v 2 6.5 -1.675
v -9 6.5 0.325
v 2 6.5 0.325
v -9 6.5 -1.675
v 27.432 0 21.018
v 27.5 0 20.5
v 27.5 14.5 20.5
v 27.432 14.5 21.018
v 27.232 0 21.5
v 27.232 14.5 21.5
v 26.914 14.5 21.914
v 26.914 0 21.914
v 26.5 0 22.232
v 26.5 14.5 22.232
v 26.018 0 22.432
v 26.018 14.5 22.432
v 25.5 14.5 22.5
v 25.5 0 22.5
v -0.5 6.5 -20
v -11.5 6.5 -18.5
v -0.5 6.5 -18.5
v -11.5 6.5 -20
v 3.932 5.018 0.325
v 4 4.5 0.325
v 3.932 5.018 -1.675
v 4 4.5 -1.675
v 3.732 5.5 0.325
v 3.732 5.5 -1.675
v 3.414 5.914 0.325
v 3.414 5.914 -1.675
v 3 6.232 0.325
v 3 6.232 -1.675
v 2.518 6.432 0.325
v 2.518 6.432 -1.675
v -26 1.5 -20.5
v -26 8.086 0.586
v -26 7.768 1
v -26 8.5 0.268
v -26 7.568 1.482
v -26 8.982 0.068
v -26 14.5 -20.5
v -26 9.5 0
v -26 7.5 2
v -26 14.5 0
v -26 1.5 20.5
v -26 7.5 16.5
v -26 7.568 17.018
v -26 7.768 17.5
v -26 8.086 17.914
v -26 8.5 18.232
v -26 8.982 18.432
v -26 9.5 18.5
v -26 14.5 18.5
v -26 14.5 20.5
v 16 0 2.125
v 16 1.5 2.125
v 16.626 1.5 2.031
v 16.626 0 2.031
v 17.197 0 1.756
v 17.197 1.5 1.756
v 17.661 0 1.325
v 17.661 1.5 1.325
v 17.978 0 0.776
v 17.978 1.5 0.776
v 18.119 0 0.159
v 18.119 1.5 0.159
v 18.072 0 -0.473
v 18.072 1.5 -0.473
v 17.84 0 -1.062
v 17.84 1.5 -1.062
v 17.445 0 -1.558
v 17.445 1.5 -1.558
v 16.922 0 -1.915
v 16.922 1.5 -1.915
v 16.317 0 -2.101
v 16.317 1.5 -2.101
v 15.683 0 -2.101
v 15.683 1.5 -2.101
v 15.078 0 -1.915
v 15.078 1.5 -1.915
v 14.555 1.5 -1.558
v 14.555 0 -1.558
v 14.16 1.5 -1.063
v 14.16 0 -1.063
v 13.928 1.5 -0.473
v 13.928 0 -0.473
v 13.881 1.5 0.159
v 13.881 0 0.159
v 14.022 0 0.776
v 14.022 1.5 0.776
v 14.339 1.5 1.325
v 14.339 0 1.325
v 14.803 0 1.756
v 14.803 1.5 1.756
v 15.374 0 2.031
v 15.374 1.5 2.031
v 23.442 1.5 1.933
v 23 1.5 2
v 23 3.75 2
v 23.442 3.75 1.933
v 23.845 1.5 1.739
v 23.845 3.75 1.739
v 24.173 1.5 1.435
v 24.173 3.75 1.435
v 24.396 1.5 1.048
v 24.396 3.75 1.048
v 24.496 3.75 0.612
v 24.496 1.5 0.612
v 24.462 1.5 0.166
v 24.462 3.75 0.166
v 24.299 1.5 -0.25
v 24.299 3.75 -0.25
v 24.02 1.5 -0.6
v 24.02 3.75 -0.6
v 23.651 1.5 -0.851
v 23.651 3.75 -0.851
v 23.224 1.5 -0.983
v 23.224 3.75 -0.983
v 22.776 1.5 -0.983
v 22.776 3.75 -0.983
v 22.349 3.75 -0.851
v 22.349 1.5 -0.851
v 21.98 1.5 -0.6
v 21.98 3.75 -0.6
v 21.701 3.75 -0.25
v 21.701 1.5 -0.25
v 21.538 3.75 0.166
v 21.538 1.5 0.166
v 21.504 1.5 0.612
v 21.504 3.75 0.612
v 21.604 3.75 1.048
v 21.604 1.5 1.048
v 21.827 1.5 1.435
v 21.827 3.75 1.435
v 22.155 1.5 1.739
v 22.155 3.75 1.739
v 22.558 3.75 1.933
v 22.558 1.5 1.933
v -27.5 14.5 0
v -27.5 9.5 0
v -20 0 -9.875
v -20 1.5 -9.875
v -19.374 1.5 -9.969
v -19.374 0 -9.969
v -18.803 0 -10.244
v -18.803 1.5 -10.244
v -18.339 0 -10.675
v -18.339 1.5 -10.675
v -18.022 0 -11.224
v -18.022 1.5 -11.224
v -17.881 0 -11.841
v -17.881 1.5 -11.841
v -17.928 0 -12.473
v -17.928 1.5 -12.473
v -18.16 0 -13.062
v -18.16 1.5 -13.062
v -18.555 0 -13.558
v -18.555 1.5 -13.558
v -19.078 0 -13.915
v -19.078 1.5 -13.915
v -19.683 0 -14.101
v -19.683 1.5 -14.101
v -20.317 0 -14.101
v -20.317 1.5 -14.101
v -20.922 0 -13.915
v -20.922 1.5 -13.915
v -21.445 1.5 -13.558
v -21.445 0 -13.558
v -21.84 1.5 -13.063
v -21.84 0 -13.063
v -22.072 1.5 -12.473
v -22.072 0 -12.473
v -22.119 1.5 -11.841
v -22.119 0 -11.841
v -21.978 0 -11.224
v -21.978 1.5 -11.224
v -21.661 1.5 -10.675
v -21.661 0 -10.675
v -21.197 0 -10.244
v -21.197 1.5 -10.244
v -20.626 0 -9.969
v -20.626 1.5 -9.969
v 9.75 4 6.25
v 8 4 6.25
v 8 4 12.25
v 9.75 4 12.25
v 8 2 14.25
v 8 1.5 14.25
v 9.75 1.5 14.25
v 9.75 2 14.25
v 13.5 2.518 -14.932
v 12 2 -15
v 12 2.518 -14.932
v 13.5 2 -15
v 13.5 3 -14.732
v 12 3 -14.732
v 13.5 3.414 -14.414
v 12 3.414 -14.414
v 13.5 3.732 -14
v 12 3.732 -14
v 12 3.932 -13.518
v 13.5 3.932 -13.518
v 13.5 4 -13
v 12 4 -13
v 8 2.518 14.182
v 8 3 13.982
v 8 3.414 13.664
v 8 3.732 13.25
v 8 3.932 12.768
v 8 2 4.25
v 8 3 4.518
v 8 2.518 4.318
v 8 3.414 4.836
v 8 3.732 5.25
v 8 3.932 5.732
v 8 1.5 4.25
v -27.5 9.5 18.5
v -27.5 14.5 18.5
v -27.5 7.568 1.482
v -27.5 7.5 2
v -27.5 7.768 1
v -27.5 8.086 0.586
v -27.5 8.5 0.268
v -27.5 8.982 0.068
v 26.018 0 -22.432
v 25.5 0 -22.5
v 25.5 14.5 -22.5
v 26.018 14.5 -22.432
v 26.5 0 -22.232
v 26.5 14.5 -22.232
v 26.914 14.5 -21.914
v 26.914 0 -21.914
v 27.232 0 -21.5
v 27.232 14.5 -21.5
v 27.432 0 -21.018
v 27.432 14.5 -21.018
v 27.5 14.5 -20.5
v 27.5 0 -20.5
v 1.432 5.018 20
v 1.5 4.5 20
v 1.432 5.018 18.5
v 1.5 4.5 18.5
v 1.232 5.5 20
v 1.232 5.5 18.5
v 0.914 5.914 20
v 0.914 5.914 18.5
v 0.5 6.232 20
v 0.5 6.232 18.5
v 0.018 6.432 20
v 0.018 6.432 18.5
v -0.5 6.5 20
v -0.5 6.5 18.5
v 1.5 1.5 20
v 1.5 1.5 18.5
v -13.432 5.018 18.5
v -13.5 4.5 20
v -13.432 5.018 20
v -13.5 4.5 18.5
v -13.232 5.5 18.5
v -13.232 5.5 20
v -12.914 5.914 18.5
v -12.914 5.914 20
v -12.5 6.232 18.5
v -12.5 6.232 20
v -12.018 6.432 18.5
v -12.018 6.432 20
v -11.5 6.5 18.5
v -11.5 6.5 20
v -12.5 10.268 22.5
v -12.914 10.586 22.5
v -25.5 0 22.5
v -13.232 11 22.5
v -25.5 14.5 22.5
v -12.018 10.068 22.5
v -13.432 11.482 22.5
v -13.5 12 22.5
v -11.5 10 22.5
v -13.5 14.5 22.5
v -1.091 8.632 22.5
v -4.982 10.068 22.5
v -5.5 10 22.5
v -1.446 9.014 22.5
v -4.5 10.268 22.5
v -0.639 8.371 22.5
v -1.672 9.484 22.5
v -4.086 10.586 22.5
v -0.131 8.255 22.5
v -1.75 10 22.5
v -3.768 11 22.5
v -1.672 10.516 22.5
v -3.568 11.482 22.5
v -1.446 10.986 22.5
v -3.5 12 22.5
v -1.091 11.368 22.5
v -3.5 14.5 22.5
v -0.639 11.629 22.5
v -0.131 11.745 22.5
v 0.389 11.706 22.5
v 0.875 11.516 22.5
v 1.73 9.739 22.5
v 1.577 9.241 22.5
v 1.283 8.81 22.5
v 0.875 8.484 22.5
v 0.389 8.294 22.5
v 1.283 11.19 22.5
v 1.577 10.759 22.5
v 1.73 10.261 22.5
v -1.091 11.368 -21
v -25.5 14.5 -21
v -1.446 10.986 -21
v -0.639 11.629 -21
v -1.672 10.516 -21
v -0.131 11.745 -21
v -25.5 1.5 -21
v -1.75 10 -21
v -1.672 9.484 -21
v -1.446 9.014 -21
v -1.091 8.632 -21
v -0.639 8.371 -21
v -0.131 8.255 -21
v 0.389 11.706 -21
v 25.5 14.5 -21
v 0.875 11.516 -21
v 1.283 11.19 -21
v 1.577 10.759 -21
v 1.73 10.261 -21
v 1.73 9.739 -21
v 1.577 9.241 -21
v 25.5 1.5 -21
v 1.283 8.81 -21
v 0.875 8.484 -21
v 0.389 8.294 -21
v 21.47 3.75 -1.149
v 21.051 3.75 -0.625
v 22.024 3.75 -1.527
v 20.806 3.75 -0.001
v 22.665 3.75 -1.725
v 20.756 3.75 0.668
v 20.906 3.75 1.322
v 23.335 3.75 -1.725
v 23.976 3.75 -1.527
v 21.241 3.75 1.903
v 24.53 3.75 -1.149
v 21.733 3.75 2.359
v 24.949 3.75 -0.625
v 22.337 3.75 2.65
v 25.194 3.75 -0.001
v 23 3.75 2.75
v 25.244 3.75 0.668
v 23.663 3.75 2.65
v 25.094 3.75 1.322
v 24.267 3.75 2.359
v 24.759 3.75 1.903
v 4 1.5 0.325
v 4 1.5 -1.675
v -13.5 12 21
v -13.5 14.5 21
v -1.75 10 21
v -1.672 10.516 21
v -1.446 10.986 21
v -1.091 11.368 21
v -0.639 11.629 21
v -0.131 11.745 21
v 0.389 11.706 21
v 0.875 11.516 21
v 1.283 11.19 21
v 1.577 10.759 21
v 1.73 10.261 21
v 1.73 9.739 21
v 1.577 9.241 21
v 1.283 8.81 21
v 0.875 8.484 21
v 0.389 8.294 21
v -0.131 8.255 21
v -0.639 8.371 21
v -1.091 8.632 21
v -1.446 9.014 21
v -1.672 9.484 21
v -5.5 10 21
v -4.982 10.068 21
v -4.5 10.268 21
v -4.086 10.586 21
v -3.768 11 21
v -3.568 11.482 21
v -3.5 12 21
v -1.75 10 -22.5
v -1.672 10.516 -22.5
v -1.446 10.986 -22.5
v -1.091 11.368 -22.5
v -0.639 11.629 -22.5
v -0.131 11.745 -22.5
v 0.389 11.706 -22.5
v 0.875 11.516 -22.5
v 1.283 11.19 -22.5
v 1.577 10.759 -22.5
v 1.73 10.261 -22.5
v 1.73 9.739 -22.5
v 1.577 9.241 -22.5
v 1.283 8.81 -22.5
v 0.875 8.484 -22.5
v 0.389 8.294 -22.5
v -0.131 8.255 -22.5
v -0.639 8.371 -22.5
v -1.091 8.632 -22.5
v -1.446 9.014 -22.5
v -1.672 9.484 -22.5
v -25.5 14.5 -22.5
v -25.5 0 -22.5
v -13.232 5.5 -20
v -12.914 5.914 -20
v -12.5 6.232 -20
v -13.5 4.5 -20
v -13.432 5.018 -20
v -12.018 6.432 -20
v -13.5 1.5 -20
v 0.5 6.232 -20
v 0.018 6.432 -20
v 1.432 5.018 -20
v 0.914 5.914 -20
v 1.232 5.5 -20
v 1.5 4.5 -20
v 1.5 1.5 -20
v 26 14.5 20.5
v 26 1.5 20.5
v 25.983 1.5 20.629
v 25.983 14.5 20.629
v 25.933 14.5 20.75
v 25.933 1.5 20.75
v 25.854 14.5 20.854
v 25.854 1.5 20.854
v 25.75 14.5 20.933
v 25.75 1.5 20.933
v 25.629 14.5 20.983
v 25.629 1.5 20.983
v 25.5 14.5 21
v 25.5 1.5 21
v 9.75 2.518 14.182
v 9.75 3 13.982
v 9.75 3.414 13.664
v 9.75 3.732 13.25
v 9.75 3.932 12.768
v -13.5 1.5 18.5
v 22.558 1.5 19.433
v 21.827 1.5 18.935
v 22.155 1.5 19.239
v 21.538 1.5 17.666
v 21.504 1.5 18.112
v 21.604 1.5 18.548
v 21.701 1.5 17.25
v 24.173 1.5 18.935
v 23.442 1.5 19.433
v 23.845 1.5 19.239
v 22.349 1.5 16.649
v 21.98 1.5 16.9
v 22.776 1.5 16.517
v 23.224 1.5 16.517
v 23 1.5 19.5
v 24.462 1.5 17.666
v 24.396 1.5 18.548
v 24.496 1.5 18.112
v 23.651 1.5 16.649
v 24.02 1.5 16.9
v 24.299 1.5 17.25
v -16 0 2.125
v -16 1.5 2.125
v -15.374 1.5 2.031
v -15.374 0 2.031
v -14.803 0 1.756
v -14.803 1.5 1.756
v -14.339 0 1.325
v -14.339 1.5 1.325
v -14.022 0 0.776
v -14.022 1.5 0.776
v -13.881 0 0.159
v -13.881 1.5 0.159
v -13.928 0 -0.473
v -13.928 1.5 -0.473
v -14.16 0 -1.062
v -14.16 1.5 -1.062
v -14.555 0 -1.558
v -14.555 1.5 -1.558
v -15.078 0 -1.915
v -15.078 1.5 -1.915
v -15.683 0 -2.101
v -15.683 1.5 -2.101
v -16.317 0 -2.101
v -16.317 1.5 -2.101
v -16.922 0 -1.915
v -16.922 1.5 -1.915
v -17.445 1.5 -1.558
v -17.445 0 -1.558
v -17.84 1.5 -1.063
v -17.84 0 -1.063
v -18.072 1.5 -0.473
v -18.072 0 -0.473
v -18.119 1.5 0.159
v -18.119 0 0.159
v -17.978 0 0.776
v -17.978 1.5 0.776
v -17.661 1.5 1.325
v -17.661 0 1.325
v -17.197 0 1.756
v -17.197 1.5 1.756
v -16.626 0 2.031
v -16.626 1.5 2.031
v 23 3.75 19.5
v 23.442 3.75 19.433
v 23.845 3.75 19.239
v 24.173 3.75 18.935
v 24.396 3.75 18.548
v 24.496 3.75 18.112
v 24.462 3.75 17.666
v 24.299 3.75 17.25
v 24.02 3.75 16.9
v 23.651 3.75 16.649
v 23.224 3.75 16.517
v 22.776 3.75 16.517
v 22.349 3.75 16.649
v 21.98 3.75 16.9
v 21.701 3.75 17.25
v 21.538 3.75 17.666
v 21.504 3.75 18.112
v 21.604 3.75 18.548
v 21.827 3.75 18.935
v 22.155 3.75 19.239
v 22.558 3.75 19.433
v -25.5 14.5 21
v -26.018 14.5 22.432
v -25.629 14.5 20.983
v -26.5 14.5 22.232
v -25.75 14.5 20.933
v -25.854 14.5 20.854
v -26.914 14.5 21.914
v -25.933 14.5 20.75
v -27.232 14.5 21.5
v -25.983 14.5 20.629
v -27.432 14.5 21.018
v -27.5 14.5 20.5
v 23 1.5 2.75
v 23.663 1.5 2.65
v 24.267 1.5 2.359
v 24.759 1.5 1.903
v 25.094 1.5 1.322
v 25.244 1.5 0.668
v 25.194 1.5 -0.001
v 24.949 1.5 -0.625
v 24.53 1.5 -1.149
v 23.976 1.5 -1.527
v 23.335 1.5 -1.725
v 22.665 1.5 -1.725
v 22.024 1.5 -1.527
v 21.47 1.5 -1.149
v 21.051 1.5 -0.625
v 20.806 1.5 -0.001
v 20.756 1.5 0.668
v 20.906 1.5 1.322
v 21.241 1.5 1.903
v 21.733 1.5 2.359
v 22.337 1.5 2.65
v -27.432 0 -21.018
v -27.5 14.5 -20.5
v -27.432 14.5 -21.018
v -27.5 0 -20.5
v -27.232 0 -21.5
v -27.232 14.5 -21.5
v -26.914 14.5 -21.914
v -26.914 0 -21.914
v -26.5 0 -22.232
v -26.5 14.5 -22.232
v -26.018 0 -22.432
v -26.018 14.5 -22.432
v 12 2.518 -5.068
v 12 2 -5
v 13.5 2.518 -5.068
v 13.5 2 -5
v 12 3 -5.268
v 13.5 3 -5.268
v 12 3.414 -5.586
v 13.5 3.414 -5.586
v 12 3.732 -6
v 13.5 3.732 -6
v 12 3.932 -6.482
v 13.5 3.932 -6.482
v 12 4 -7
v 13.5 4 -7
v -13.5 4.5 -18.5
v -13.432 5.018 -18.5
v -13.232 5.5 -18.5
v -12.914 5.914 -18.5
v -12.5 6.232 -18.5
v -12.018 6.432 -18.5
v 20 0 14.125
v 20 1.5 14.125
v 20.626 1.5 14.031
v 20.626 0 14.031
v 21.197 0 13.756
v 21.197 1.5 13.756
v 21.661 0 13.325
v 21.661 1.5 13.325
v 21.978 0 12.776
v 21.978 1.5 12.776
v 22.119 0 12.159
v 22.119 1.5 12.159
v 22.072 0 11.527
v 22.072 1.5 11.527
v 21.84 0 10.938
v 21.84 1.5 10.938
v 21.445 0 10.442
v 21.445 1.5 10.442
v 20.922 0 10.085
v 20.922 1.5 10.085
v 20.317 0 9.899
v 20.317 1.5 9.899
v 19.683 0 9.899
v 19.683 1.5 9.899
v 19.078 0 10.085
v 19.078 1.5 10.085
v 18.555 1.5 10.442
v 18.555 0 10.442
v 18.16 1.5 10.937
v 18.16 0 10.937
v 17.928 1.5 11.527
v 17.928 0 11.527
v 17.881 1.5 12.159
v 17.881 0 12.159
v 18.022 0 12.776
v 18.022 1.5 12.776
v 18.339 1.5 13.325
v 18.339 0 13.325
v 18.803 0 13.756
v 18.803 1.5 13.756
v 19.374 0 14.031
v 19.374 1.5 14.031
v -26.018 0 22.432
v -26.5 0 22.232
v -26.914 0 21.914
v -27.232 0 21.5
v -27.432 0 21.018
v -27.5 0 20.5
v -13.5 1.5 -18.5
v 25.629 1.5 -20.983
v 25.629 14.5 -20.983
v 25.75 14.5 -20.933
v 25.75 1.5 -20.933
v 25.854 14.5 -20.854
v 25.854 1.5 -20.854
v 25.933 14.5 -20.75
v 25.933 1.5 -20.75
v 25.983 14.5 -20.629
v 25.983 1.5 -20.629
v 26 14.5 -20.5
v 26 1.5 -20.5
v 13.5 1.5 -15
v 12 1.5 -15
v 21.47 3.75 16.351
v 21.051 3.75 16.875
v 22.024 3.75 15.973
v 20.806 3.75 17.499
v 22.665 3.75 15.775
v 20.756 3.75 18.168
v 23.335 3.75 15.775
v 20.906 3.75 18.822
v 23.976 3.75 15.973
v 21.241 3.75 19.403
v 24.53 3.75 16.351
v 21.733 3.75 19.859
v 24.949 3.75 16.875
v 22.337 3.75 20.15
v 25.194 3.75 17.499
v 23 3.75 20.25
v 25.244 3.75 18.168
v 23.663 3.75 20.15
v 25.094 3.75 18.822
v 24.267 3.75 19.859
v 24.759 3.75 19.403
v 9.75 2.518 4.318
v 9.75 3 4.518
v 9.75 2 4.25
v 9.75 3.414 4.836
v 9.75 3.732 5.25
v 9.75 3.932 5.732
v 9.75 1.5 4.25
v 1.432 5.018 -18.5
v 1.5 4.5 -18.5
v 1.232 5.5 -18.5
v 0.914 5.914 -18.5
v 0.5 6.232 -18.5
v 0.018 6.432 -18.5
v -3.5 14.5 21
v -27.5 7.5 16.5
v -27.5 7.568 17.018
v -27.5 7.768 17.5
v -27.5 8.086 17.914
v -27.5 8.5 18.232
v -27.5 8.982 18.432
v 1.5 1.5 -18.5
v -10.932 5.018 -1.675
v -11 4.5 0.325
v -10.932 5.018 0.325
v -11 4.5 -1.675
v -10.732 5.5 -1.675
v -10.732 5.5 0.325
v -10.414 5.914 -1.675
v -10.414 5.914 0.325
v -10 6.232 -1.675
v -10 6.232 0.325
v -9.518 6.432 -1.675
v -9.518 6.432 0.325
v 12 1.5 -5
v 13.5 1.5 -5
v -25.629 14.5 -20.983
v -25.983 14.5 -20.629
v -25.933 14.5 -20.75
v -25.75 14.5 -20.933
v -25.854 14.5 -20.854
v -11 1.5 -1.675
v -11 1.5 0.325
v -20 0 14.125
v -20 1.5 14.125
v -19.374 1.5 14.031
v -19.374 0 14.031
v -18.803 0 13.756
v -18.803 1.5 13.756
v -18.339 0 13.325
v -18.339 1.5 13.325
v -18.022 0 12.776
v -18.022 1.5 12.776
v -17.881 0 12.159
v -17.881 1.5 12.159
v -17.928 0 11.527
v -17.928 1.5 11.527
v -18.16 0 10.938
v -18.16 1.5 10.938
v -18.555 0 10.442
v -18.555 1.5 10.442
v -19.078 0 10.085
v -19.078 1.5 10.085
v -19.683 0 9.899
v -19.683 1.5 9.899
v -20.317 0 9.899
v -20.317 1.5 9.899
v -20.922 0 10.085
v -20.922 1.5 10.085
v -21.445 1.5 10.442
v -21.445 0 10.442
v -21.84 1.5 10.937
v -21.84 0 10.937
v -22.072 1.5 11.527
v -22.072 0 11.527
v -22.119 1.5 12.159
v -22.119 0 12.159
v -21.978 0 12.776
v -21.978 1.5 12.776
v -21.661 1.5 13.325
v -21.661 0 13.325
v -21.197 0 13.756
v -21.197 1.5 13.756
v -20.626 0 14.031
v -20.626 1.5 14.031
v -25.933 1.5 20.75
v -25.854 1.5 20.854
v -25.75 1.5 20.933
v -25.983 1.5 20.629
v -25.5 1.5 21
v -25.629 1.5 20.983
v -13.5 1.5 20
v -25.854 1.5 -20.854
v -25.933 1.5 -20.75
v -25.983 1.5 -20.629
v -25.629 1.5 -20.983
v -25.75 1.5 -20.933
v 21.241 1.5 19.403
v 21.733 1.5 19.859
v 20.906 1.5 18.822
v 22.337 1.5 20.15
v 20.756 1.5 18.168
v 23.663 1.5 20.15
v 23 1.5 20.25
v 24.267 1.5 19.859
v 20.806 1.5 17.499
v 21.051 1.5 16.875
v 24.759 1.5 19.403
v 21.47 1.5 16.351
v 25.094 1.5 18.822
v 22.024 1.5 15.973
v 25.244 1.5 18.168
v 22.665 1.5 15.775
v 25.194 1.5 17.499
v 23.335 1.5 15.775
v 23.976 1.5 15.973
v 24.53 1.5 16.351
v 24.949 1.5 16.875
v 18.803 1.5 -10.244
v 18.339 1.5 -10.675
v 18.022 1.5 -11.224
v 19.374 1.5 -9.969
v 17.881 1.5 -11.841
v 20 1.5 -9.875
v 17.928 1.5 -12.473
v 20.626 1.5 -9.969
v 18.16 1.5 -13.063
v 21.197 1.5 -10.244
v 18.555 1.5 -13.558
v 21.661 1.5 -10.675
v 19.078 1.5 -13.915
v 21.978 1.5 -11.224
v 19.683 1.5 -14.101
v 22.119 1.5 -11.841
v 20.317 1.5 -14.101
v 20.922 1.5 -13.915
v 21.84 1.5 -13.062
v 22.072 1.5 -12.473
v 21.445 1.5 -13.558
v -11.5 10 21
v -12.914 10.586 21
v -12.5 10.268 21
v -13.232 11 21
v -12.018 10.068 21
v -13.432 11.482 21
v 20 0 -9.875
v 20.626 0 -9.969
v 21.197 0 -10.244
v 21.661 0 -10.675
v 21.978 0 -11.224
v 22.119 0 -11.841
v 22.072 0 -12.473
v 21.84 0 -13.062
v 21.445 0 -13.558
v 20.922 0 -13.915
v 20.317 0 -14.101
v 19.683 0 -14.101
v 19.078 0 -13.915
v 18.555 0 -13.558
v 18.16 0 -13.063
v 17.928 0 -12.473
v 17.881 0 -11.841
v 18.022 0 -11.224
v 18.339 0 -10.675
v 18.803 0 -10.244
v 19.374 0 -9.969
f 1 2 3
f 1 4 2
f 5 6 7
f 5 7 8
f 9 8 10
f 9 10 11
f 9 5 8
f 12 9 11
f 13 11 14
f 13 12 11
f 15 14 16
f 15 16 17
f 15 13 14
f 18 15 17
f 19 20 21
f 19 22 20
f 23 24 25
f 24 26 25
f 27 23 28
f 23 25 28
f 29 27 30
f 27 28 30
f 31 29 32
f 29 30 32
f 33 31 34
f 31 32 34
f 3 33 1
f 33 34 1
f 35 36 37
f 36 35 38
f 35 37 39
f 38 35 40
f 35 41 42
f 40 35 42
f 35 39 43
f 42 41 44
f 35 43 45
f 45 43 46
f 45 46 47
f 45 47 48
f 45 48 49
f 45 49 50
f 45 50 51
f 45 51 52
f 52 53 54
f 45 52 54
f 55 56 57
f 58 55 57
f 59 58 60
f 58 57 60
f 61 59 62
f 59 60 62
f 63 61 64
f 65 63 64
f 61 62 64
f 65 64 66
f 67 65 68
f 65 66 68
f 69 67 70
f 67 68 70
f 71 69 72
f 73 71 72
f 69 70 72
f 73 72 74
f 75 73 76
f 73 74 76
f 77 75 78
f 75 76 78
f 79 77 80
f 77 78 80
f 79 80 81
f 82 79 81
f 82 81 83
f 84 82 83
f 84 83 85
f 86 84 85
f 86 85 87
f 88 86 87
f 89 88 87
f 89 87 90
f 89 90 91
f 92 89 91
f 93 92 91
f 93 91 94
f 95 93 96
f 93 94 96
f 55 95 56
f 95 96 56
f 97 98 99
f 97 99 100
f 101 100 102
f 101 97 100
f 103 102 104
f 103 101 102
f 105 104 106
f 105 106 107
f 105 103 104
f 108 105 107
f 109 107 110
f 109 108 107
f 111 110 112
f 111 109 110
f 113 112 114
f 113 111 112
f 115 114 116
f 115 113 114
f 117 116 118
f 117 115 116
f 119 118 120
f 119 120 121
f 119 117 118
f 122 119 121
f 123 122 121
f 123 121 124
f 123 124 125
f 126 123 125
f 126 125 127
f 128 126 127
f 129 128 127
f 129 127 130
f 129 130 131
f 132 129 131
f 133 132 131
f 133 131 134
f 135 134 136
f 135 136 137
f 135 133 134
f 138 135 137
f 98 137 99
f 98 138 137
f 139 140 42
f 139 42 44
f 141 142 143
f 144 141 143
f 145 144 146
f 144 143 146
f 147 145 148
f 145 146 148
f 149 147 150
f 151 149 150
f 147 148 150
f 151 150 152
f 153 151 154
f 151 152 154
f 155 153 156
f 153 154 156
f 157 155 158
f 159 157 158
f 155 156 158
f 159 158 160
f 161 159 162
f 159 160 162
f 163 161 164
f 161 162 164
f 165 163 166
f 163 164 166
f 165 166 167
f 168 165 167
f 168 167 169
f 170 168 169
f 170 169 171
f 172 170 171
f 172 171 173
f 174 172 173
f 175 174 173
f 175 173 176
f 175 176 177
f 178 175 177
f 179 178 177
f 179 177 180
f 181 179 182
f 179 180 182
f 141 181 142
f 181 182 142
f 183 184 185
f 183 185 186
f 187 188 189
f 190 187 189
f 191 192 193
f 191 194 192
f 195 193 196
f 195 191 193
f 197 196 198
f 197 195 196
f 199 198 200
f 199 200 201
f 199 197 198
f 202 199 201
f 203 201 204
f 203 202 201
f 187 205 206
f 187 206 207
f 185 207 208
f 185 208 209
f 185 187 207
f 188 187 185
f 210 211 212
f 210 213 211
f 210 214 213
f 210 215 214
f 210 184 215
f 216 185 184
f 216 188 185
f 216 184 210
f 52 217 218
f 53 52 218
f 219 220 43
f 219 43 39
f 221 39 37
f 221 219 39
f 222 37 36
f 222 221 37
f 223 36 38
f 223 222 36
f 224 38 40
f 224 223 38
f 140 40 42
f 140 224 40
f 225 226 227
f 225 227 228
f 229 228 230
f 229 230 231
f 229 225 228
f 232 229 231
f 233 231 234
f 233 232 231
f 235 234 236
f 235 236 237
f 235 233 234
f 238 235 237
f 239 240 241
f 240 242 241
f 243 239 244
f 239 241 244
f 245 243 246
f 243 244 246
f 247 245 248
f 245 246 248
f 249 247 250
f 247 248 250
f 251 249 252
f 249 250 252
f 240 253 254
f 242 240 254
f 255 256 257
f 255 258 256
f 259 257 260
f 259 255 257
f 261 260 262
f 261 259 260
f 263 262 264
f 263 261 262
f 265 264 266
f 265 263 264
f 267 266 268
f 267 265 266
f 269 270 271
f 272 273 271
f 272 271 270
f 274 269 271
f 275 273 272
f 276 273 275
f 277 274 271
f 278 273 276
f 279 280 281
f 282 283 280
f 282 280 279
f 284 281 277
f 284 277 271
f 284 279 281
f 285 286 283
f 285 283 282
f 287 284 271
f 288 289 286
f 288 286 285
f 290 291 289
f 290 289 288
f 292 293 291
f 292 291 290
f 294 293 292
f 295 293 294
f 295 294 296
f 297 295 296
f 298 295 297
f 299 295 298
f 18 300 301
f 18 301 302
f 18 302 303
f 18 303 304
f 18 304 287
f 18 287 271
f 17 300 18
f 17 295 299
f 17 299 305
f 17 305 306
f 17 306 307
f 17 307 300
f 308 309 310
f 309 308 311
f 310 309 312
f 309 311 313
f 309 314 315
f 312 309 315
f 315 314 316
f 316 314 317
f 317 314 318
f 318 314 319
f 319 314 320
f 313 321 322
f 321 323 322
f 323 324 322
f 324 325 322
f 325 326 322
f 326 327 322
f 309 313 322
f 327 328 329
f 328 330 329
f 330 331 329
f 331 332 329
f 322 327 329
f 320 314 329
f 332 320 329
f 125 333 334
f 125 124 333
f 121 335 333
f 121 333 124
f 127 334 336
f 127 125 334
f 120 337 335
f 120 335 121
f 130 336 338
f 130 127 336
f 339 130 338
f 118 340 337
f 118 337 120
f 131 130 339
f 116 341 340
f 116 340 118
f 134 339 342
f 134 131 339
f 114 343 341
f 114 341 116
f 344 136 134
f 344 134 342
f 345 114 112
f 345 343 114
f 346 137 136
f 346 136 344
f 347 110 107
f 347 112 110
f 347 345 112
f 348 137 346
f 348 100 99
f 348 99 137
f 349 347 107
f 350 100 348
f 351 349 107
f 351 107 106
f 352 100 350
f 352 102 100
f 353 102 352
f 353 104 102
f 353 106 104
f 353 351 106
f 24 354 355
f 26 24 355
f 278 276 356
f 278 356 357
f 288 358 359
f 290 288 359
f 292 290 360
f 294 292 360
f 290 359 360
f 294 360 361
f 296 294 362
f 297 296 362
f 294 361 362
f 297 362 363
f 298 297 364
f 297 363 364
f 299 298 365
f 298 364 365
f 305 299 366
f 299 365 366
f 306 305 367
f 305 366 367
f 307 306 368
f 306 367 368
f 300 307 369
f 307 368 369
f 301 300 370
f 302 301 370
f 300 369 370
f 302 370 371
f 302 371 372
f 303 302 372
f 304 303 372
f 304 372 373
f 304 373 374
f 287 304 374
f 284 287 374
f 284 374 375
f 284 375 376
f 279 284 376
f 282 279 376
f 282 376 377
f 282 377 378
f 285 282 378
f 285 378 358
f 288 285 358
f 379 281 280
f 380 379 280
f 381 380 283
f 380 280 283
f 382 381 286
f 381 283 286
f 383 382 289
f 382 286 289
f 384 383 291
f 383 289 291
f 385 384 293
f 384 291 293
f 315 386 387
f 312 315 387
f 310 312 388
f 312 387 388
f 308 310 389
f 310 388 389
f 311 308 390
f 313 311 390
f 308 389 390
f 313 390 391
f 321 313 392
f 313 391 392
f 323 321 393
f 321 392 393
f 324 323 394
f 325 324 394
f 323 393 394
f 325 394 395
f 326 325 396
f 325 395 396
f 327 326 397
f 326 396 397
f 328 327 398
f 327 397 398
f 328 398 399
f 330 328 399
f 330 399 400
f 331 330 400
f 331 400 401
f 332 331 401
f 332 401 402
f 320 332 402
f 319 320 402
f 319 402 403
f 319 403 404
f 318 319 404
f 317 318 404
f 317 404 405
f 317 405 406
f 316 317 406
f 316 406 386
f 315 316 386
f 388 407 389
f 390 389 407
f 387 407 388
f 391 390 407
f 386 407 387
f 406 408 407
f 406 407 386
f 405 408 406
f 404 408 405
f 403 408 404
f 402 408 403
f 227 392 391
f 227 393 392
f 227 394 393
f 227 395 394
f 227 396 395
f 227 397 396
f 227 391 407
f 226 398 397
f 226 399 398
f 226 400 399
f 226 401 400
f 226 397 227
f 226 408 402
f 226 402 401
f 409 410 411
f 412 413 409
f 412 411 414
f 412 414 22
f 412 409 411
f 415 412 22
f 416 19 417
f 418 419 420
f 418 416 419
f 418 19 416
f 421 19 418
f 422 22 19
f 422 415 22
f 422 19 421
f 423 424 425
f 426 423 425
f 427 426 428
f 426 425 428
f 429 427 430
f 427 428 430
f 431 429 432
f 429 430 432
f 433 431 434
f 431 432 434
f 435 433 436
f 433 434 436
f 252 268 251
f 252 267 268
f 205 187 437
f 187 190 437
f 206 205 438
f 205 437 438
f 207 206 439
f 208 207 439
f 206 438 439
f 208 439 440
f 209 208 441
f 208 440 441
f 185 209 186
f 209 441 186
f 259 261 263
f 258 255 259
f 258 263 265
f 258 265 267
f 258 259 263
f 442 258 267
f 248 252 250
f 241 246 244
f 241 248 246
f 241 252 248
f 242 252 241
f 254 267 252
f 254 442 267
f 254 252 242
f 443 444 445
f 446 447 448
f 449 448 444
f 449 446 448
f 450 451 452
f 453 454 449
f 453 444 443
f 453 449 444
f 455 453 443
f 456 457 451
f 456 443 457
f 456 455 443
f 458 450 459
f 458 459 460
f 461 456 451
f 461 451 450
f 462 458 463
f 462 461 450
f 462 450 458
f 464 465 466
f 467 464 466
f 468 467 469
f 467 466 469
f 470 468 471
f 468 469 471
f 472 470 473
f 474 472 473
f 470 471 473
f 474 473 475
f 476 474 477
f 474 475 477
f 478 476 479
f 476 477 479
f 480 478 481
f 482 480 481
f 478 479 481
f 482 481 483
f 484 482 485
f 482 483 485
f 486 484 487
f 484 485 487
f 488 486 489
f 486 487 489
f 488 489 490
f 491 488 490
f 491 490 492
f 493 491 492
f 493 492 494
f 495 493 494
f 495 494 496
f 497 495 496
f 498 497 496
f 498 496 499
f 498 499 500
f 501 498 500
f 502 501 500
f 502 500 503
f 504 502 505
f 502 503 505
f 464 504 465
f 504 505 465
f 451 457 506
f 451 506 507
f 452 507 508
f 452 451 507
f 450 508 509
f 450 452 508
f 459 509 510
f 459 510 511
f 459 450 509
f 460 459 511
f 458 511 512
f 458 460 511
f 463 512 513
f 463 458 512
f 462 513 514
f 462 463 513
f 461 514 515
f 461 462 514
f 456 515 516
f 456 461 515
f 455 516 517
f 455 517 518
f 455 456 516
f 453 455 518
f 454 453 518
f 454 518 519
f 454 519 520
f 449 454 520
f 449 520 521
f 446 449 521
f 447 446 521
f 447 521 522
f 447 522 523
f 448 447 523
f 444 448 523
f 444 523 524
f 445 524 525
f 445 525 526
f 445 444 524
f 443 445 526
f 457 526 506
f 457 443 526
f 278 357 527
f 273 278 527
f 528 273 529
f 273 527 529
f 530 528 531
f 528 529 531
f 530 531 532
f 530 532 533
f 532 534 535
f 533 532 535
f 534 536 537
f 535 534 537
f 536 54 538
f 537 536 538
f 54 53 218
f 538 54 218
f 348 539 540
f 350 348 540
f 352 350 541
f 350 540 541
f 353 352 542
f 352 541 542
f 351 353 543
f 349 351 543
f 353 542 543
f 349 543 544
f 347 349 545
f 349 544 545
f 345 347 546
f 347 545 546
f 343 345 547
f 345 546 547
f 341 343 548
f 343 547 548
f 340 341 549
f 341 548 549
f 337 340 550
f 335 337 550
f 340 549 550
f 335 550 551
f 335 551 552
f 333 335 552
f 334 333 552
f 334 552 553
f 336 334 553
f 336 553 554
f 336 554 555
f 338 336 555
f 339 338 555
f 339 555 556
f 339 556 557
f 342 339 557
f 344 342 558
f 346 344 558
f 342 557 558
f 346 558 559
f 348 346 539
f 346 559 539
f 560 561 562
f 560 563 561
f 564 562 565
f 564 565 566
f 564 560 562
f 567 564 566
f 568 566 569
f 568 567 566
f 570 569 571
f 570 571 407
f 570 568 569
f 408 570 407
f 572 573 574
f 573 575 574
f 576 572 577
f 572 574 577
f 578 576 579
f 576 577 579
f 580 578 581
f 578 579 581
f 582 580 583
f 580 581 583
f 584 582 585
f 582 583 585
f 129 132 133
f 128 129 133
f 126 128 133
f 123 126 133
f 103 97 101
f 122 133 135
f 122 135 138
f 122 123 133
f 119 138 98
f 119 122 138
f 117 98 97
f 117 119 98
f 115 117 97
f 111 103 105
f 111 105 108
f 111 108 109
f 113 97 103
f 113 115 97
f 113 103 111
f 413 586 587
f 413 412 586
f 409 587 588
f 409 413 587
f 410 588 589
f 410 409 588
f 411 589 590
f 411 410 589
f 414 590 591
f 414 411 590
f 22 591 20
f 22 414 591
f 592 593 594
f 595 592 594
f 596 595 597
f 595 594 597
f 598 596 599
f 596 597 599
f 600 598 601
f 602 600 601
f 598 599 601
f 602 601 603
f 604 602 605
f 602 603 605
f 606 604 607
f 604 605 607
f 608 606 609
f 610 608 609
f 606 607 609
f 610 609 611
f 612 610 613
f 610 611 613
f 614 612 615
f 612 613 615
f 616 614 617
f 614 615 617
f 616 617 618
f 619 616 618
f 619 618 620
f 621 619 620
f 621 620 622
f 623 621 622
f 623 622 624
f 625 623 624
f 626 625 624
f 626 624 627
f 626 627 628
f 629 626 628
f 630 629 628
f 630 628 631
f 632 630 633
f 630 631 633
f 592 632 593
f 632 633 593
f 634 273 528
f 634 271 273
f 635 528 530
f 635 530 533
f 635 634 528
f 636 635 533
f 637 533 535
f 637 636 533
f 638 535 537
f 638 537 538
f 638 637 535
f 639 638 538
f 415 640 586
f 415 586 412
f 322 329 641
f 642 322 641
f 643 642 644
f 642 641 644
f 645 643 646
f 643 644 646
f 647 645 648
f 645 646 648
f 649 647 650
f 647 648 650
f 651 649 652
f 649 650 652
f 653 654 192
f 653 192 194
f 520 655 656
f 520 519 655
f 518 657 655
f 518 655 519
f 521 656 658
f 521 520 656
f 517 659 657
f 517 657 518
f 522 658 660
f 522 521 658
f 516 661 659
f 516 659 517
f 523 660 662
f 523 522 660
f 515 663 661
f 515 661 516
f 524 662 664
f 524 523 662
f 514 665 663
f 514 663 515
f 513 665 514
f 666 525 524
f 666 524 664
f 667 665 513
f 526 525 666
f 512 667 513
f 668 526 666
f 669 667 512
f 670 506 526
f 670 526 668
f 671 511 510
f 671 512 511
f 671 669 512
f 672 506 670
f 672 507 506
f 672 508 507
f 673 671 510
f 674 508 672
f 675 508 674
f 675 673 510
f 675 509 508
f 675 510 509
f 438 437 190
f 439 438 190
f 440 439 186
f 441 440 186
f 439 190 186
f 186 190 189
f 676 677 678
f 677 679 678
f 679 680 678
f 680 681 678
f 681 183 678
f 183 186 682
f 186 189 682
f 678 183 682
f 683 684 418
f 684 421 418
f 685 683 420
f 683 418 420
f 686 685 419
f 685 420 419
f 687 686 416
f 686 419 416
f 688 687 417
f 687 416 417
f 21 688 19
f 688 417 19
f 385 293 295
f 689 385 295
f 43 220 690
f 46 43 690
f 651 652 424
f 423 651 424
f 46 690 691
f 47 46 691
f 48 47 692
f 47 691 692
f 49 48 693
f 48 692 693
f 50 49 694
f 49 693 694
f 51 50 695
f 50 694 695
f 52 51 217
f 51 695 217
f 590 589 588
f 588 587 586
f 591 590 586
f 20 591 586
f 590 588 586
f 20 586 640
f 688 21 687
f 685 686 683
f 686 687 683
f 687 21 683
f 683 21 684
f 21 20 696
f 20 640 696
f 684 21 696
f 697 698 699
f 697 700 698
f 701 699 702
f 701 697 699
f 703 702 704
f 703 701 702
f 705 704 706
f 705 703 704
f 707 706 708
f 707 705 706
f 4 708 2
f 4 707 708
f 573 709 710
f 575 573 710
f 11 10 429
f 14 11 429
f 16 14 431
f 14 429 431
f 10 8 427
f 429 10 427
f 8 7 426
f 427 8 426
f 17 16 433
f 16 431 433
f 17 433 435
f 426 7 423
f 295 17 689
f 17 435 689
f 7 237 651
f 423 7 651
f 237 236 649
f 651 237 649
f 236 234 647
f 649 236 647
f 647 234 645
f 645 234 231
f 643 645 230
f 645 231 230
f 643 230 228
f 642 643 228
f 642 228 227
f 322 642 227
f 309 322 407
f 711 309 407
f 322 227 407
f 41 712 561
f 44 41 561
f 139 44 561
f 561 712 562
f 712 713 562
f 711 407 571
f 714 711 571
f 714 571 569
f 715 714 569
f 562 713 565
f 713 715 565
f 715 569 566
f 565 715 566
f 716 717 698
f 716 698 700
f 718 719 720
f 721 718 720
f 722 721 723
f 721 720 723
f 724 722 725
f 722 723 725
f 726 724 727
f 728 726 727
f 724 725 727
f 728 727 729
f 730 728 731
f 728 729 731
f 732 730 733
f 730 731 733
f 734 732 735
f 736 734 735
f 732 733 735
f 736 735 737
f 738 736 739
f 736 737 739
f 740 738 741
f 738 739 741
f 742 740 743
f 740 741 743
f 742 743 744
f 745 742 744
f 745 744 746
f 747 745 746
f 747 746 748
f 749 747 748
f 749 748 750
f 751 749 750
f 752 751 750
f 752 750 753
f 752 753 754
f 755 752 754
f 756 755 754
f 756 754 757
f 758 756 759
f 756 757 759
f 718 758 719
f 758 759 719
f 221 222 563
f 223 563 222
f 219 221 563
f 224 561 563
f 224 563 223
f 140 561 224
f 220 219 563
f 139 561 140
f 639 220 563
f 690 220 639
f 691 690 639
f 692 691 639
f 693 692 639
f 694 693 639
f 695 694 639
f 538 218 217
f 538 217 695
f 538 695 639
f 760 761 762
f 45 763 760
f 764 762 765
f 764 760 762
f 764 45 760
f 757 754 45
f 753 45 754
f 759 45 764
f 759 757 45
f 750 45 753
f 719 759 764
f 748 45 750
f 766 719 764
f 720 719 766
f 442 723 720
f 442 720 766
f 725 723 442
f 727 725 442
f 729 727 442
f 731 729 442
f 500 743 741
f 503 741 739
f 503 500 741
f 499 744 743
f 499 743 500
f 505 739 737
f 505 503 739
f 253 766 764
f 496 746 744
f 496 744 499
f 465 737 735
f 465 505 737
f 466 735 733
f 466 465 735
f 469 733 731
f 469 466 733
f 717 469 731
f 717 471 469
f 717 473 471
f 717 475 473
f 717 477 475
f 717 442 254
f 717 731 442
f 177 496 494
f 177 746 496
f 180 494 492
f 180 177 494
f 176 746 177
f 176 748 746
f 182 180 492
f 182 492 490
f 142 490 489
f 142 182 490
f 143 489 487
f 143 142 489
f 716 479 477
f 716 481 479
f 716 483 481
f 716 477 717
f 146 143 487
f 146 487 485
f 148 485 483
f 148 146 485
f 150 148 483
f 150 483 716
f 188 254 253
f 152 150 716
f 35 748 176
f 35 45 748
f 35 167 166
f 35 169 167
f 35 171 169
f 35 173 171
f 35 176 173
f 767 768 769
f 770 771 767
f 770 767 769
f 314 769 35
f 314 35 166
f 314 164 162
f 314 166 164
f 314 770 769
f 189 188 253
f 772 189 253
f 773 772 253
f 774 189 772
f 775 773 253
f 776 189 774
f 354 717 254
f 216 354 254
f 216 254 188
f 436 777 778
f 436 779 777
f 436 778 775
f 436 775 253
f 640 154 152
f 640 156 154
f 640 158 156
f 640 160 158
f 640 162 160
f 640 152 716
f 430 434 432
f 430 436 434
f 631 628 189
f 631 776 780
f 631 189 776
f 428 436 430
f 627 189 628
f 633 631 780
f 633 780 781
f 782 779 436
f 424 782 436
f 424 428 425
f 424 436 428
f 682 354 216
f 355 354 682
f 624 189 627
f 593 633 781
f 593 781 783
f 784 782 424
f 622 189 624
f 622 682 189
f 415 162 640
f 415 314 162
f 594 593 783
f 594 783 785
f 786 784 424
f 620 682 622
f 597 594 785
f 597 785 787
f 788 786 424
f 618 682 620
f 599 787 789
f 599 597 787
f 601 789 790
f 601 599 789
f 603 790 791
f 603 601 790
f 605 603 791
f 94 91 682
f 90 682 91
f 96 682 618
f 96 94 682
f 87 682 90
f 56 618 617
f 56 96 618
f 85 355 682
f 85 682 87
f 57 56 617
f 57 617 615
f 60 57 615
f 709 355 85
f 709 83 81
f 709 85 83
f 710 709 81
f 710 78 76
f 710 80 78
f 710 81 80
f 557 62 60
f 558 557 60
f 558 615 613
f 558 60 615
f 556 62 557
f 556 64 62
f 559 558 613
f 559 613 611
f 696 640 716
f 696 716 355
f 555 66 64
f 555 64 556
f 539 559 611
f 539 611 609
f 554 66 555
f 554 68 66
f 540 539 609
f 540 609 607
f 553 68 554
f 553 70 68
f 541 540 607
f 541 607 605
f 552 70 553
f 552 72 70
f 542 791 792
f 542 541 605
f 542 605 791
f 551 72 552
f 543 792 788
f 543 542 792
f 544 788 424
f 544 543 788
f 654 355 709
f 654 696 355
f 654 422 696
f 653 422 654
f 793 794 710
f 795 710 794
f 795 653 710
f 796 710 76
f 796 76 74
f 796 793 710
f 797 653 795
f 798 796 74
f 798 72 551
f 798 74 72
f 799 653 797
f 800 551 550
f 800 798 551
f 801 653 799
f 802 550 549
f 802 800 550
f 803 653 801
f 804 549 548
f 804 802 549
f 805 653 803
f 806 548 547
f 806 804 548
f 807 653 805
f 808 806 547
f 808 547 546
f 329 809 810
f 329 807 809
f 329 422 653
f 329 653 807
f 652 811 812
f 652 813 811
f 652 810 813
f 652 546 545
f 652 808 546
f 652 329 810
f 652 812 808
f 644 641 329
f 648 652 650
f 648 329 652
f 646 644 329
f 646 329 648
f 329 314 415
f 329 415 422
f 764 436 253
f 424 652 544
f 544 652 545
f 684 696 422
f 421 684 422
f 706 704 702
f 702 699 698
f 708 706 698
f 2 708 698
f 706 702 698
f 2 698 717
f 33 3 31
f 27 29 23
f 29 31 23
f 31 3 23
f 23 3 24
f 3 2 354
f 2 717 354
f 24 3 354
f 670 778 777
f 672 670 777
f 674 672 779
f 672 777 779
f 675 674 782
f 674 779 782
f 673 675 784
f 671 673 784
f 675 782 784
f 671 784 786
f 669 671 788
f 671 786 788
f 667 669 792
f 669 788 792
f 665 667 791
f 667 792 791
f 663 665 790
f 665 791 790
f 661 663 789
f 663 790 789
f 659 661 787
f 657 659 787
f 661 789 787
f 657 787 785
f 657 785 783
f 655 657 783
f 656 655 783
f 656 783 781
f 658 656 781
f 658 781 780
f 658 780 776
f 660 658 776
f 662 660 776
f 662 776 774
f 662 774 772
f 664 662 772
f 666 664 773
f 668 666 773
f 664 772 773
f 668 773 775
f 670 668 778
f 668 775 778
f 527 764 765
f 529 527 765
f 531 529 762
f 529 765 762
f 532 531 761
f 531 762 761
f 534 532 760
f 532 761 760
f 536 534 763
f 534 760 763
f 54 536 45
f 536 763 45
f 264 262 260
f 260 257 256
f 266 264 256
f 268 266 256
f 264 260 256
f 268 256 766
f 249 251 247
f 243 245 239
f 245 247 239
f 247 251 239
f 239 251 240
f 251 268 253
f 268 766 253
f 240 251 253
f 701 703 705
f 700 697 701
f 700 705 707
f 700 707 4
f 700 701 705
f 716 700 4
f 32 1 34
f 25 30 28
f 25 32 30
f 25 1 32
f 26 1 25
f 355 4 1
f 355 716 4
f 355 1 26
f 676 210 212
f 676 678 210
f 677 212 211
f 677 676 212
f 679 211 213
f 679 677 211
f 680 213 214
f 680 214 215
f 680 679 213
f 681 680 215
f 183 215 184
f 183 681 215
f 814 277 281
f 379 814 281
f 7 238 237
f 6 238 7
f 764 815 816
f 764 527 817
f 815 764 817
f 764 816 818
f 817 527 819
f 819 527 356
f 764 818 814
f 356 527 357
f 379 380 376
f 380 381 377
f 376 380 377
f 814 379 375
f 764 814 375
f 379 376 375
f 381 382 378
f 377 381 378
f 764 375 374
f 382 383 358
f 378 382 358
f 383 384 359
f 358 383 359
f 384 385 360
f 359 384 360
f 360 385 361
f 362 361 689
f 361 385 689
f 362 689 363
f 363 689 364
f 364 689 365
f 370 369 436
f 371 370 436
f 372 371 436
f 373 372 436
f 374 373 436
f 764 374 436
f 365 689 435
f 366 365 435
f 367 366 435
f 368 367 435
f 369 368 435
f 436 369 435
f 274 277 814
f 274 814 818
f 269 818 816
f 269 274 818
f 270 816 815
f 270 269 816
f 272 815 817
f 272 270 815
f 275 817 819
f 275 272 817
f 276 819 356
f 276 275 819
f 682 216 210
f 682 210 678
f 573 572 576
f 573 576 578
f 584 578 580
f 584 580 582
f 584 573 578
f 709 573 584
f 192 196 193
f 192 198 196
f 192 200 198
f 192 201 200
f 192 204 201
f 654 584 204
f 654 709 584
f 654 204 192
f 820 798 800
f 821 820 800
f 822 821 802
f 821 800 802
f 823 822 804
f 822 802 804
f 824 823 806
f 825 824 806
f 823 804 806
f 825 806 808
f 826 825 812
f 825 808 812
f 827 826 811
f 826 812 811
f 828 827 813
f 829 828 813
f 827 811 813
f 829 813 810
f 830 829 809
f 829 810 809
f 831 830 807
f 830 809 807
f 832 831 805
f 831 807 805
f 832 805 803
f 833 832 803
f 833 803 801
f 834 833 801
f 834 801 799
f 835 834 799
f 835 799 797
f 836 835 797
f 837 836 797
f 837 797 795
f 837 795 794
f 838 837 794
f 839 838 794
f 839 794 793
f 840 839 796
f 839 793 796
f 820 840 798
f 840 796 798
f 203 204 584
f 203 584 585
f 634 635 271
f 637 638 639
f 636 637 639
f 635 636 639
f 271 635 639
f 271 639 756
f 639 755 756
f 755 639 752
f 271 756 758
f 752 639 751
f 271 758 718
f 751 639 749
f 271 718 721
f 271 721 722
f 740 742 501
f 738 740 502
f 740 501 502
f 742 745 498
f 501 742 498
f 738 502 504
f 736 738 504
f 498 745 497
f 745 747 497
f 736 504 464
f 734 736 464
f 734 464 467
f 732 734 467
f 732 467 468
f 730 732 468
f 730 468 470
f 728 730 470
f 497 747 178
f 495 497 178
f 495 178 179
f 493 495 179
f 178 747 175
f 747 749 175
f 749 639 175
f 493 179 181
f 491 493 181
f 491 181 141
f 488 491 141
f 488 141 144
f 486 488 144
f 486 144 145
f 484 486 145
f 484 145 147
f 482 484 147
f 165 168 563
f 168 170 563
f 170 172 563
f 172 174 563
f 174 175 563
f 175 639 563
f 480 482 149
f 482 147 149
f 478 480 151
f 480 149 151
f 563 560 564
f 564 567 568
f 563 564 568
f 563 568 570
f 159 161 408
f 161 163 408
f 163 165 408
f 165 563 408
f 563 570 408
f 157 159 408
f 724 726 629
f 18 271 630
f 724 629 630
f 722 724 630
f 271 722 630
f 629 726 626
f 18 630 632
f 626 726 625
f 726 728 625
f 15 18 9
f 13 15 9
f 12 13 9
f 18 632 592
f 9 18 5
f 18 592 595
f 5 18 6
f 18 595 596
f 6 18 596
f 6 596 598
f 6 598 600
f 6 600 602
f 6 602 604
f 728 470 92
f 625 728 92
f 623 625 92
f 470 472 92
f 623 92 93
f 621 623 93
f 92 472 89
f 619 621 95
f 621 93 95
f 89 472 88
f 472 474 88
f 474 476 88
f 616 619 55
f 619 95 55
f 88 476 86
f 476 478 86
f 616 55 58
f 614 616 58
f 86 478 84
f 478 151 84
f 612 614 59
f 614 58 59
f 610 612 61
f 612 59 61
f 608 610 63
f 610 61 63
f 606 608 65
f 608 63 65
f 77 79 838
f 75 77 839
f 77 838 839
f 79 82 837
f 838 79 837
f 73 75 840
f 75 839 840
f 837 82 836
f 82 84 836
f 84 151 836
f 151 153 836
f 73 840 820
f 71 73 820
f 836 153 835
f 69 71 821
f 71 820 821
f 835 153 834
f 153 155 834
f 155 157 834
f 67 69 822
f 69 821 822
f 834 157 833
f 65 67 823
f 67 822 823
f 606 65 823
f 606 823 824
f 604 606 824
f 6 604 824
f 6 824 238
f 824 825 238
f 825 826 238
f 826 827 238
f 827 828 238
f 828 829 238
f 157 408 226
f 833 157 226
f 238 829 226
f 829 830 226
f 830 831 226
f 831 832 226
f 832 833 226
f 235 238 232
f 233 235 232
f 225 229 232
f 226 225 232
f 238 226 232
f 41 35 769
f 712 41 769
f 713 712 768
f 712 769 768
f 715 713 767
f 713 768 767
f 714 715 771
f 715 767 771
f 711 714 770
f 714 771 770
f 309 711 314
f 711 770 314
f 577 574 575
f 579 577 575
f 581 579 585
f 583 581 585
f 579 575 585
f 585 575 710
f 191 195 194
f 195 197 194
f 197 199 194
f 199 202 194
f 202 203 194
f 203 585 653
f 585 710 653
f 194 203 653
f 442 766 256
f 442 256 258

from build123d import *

# Parameters (mm, degrees)
SALIENTE_EXTRUIR1_DEPTH = 1.5
SALIENTE_EXTRUIR3_DEPTH = 13
CROQUIS4_W              = 15
CROQUIS4_H              = 1.5
CROQUIS4_H_2            = 2
SALIENTE_EXTRUIR4_DEPTH = 5
CROQUIS5_W              = 1.5
CROQUIS5_H              = 10
CROQUIS5_W_2            = 1.75
SALIENTE_EXTRUIR5_DEPTH = 2.5
CROQUIS6_W              = 18.5
CROQUIS6_H              = 7
CORTAR_EXTRUIR1_DEPTH   = 1.5
CROQUIS7_W              = 10
CROQUIS7_H              = 4.5
CORTAR_EXTRUIR2_DEPTH   = 1.5
CROQUIS8_R              = 2.25
CROQUIS8_R_2            = 1.5
SALIENTE_EXTRUIR6_DEPTH = 2.25
CORTAR_EXTRUIR3_REACH   = 56.695
CROQUIS9_R              = 1.75
CROQUIS10_R             = 2.125
CORTAR_EXTRUIR4_DEPTH   = 1.5
CROQUIS11_R             = 2.125
CORTAR_EXTRUIR5_DEPTH   = 1.5
SALIENTE_EXTRUIR8_DEPTH = 1.5
SALIENTE_EXTRUIR9_DEPTH = 1.5
REDONDEO2_R             = 2


with BuildPart() as part:
    # Croquis1 → Saliente-Extruir1 (new body)
    with BuildSketch(Plane(origin=(0, 0, 0), x_dir=(1, 0, 0), z_dir=(0, 1, 0))):
        with BuildLine():
            Line((-25.5, -22.5), (25.5, -22.5))
            ThreePointArc((25.5, -22.5), (26.914213562, -21.914213562), (27.5, -20.5))
            Line((27.5, -20.5), (27.5, 20.5))
            ThreePointArc((27.5, 20.5), (26.914213562, 21.914213562), (25.5, 22.5))
            Line((25.5, 22.5), (-25.5, 22.5))
            ThreePointArc((-25.5, 22.5), (-26.914213562, 21.914213562), (-27.5, 20.5))
            Line((-27.5, 20.5), (-27.5, -20.5))
            ThreePointArc((-27.5, -20.5), (-26.914213562, -21.914213562), (-25.5, -22.5))
        make_face()
    extrude(amount=SALIENTE_EXTRUIR1_DEPTH)

    # Croquis3 → Saliente-Extruir3 (add)
    with BuildSketch(Plane(origin=(0, 1.5, 0), x_dir=(1, 0, 0), z_dir=(0, 1, 0))):
        with BuildLine():
            Line((-25.5, 22.5), (25.5, 22.5))
            ThreePointArc((25.5, 22.5), (26.914213562, 21.914213562), (27.5, 20.5))
            Line((27.5, 20.5), (27.5, -20.5))
            ThreePointArc((27.5, -20.5), (26.914213562, -21.914213562), (25.5, -22.5))
            Line((25.5, -22.5), (-25.5, -22.5))
            ThreePointArc((-25.5, -22.5), (-26.914213562, -21.914213562), (-27.5, -20.5))
            Line((-27.5, -20.5), (-27.5, 20.5))
            ThreePointArc((-27.5, 20.5), (-26.914213562, 21.914213562), (-25.5, 22.5))
        make_face()
        with BuildLine():
            Line((-25.5, 21), (25.5, 21))
            ThreePointArc((25.5, 21), (25.853553391, 20.853553391), (26, 20.5))
            Line((26, 20.5), (26, -20.5))
            ThreePointArc((26, -20.5), (25.853553391, -20.853553391), (25.5, -21))
            Line((25.5, -21), (-25.5, -21))
            ThreePointArc((-25.5, -21), (-25.853553391, -20.853553391), (-26, -20.5))
            Line((-26, -20.5), (-26, 20.5))
            ThreePointArc((-26, 20.5), (-25.853553391, 20.853553391), (-25.5, 21))
        make_face(mode=Mode.SUBTRACT)
    extrude(amount=SALIENTE_EXTRUIR3_DEPTH)

    # Croquis4 → Saliente-Extruir4 (add)
    with BuildSketch(Plane(origin=(0, 1.5, 0), x_dir=(1, 0, 0), z_dir=(0, 1, 0))):
        with Locations((-6, 19.25)):
            Rectangle(CROQUIS4_W, CROQUIS4_H)
        with Locations((-6, -19.25)):
            Rectangle(CROQUIS4_W, CROQUIS4_H)
        with Locations((-3.5, 0.675)):
            Rectangle(CROQUIS4_W, CROQUIS4_H_2)
    extrude(amount=SALIENTE_EXTRUIR4_DEPTH)

    # Croquis5 → Saliente-Extruir5 (add)
    with BuildSketch(Plane(origin=(0, 1.5, 0), x_dir=(1, 0, 0), z_dir=(0, 1, 0))):
        with Locations((12.75, 10)):
            Rectangle(CROQUIS5_W, CROQUIS5_H)
        with Locations((8.875, -9.25)):
            Rectangle(CROQUIS5_W_2, CROQUIS5_H)
    extrude(amount=SALIENTE_EXTRUIR5_DEPTH)

    # Croquis6 → Cortar-Extruir1 (cut)
    with BuildSketch(Plane.ZY.offset(27.5)):
        with Locations((9.25, 11)):
            Rectangle(CROQUIS6_W, CROQUIS6_H)
    extrude(amount=-CORTAR_EXTRUIR1_DEPTH, mode=Mode.SUBTRACT)

    # Croquis7 → Cortar-Extruir2 (cut)
    with BuildSketch(Plane.XY.offset(22.5)):
        with Locations((-8.5, 12.25)):
            Rectangle(CROQUIS7_W, CROQUIS7_H)
    extrude(amount=-CORTAR_EXTRUIR2_DEPTH, mode=Mode.SUBTRACT)

    # Croquis8 → Saliente-Extruir6 (add)
    # profile 1 of 2: a face of its own
    with BuildSketch(Plane(origin=(0, 1.5, 0), x_dir=(1, 0, 0), z_dir=(0, 1, 0))):
        with Locations(Location((23, -18, 0), (0, 0, 270))):
            Circle(CROQUIS8_R)
        with Locations(Location((23, -18, 0), (0, 0, 270))):
            Circle(CROQUIS8_R_2, mode=Mode.SUBTRACT)
    # profile 2 of 2: a face of its own
    with BuildSketch(Plane(origin=(0, 1.5, 0), x_dir=(1, 0, 0), z_dir=(0, 1, 0))):
        with Locations(Location((23, -0.5, 0), (0, 0, 270))):
            Circle(CROQUIS8_R)
        with Locations(Location((23, -0.5, 0), (0, 0, 270))):
            Circle(CROQUIS8_R_2, mode=Mode.SUBTRACT)
    extrude(amount=SALIENTE_EXTRUIR6_DEPTH)

    # Cortar-Extruir3: up to this face of the body (flat: up to its plane)
    cortar_extruir3_end = Plane(part.part.faces().sort_by_distance((0.55075594, 6.926025918, 22.5))[0])
    # Croquis9 → Cortar-Extruir3 (cut, up to the picked face)
    with BuildSketch(Plane(origin=(0, 0, -22.5), x_dir=(-1, 0, 0), z_dir=(0, 0, -1)), mode=Mode.PRIVATE) as cortar_extruir3_sk1:
        with Locations((0, 10)):
            Circle(CROQUIS9_R)
    cortar_extruir3_tool1 = split(extrude(cortar_extruir3_sk1.sketch, amount=-CORTAR_EXTRUIR3_REACH, mode=Mode.PRIVATE), bisect_by=cortar_extruir3_end, keep=Keep.BOTH, mode=Mode.PRIVATE)
    add(cortar_extruir3_tool1.solids().sort_by(Axis((0, 10, -22.5), (0, 0, 1)))[0], mode=Mode.SUBTRACT)

    # Croquis10 → Cortar-Extruir4 (cut)
    with BuildSketch(Plane(origin=(0, 1.5, 0), x_dir=(1, 0, 0), z_dir=(0, 1, 0))):
        with Locations(Location((-16, 0, 0), (0, 0, 270))):
            Circle(CROQUIS10_R)
        with Locations(Location((16, 0, 0), (0, 0, 270))):
            Circle(CROQUIS10_R)
    extrude(amount=-CORTAR_EXTRUIR4_DEPTH, mode=Mode.SUBTRACT)

    # Croquis11 → Cortar-Extruir5 (cut)
    with BuildSketch(Plane(origin=(0, 1.5, 0), x_dir=(1, 0, 0), z_dir=(0, 1, 0))):
        with Locations(Location((-20, 12, 0), (0, 0, 270))):
            Circle(CROQUIS11_R)
        with Locations(Location((20, 12, 0), (0, 0, 270))):
            Circle(CROQUIS11_R)
        with Locations(Location((20, -12, 0), (0, 0, 270))):
            Circle(CROQUIS11_R)
        with Locations(Location((-20, -12, 0), (0, 0, 270))):
            Circle(CROQUIS11_R)
    extrude(amount=-CORTAR_EXTRUIR5_DEPTH, mode=Mode.SUBTRACT)

    # Croquis12 → Saliente-Extruir8 (add)
    with BuildSketch(Plane.ZY.offset(27.5)):
        with BuildLine():
            Line((0, 7.5), (2, 7.5))
            ThreePointArc((2, 7.5), (0.585786438, 8.085786438), (0, 9.5))
            Line((0, 9.5), (0, 7.5))
        make_face()
        with BuildLine():
            Line((18.5, 9.5), (18.5, 7.5))
            Line((18.5, 7.5), (16.5, 7.5))
            ThreePointArc((16.5, 7.5), (17.914213562, 8.085786438), (18.5, 9.5))
        make_face()
    extrude(amount=-SALIENTE_EXTRUIR8_DEPTH)

    # Croquis13 → Saliente-Extruir9 (add)
    with BuildSketch(Plane.XY.offset(22.5)):
        with BuildLine():
            Line((-13.5, 12), (-13.5, 10))
            Line((-13.5, 10), (-11.5, 10))
            ThreePointArc((-11.5, 10), (-12.914213562, 10.585786438), (-13.5, 12))
        make_face()
        with BuildLine():
            Line((-3.5, 12), (-3.5, 10))
            Line((-3.5, 10), (-5.5, 10))
            ThreePointArc((-5.5, 10), (-4.085786438, 10.585786438), (-3.5, 12))
        make_face()
    extrude(amount=-SALIENTE_EXTRUIR9_DEPTH)

    # Redondeo2
    redondeo2_edges = [part.edges().sort_by_distance(p)[0] for p in [
        (12.75, 4, -15),
        (12.75, 4, -5),
        (8.875, 4, 4.25),
        (8.875, 4, 14.25),
        (-13.5, 6.5, -19.25),
        (1.5, 6.5, -19.25),
        (1.5, 6.5, 19.25),
        (-13.5, 6.5, 19.25),
        (-11, 6.5, -0.675),
        (4, 6.5, -0.675),
    ]]
    fillet(redondeo2_edges, radius=REDONDEO2_R)


solid = part.part
